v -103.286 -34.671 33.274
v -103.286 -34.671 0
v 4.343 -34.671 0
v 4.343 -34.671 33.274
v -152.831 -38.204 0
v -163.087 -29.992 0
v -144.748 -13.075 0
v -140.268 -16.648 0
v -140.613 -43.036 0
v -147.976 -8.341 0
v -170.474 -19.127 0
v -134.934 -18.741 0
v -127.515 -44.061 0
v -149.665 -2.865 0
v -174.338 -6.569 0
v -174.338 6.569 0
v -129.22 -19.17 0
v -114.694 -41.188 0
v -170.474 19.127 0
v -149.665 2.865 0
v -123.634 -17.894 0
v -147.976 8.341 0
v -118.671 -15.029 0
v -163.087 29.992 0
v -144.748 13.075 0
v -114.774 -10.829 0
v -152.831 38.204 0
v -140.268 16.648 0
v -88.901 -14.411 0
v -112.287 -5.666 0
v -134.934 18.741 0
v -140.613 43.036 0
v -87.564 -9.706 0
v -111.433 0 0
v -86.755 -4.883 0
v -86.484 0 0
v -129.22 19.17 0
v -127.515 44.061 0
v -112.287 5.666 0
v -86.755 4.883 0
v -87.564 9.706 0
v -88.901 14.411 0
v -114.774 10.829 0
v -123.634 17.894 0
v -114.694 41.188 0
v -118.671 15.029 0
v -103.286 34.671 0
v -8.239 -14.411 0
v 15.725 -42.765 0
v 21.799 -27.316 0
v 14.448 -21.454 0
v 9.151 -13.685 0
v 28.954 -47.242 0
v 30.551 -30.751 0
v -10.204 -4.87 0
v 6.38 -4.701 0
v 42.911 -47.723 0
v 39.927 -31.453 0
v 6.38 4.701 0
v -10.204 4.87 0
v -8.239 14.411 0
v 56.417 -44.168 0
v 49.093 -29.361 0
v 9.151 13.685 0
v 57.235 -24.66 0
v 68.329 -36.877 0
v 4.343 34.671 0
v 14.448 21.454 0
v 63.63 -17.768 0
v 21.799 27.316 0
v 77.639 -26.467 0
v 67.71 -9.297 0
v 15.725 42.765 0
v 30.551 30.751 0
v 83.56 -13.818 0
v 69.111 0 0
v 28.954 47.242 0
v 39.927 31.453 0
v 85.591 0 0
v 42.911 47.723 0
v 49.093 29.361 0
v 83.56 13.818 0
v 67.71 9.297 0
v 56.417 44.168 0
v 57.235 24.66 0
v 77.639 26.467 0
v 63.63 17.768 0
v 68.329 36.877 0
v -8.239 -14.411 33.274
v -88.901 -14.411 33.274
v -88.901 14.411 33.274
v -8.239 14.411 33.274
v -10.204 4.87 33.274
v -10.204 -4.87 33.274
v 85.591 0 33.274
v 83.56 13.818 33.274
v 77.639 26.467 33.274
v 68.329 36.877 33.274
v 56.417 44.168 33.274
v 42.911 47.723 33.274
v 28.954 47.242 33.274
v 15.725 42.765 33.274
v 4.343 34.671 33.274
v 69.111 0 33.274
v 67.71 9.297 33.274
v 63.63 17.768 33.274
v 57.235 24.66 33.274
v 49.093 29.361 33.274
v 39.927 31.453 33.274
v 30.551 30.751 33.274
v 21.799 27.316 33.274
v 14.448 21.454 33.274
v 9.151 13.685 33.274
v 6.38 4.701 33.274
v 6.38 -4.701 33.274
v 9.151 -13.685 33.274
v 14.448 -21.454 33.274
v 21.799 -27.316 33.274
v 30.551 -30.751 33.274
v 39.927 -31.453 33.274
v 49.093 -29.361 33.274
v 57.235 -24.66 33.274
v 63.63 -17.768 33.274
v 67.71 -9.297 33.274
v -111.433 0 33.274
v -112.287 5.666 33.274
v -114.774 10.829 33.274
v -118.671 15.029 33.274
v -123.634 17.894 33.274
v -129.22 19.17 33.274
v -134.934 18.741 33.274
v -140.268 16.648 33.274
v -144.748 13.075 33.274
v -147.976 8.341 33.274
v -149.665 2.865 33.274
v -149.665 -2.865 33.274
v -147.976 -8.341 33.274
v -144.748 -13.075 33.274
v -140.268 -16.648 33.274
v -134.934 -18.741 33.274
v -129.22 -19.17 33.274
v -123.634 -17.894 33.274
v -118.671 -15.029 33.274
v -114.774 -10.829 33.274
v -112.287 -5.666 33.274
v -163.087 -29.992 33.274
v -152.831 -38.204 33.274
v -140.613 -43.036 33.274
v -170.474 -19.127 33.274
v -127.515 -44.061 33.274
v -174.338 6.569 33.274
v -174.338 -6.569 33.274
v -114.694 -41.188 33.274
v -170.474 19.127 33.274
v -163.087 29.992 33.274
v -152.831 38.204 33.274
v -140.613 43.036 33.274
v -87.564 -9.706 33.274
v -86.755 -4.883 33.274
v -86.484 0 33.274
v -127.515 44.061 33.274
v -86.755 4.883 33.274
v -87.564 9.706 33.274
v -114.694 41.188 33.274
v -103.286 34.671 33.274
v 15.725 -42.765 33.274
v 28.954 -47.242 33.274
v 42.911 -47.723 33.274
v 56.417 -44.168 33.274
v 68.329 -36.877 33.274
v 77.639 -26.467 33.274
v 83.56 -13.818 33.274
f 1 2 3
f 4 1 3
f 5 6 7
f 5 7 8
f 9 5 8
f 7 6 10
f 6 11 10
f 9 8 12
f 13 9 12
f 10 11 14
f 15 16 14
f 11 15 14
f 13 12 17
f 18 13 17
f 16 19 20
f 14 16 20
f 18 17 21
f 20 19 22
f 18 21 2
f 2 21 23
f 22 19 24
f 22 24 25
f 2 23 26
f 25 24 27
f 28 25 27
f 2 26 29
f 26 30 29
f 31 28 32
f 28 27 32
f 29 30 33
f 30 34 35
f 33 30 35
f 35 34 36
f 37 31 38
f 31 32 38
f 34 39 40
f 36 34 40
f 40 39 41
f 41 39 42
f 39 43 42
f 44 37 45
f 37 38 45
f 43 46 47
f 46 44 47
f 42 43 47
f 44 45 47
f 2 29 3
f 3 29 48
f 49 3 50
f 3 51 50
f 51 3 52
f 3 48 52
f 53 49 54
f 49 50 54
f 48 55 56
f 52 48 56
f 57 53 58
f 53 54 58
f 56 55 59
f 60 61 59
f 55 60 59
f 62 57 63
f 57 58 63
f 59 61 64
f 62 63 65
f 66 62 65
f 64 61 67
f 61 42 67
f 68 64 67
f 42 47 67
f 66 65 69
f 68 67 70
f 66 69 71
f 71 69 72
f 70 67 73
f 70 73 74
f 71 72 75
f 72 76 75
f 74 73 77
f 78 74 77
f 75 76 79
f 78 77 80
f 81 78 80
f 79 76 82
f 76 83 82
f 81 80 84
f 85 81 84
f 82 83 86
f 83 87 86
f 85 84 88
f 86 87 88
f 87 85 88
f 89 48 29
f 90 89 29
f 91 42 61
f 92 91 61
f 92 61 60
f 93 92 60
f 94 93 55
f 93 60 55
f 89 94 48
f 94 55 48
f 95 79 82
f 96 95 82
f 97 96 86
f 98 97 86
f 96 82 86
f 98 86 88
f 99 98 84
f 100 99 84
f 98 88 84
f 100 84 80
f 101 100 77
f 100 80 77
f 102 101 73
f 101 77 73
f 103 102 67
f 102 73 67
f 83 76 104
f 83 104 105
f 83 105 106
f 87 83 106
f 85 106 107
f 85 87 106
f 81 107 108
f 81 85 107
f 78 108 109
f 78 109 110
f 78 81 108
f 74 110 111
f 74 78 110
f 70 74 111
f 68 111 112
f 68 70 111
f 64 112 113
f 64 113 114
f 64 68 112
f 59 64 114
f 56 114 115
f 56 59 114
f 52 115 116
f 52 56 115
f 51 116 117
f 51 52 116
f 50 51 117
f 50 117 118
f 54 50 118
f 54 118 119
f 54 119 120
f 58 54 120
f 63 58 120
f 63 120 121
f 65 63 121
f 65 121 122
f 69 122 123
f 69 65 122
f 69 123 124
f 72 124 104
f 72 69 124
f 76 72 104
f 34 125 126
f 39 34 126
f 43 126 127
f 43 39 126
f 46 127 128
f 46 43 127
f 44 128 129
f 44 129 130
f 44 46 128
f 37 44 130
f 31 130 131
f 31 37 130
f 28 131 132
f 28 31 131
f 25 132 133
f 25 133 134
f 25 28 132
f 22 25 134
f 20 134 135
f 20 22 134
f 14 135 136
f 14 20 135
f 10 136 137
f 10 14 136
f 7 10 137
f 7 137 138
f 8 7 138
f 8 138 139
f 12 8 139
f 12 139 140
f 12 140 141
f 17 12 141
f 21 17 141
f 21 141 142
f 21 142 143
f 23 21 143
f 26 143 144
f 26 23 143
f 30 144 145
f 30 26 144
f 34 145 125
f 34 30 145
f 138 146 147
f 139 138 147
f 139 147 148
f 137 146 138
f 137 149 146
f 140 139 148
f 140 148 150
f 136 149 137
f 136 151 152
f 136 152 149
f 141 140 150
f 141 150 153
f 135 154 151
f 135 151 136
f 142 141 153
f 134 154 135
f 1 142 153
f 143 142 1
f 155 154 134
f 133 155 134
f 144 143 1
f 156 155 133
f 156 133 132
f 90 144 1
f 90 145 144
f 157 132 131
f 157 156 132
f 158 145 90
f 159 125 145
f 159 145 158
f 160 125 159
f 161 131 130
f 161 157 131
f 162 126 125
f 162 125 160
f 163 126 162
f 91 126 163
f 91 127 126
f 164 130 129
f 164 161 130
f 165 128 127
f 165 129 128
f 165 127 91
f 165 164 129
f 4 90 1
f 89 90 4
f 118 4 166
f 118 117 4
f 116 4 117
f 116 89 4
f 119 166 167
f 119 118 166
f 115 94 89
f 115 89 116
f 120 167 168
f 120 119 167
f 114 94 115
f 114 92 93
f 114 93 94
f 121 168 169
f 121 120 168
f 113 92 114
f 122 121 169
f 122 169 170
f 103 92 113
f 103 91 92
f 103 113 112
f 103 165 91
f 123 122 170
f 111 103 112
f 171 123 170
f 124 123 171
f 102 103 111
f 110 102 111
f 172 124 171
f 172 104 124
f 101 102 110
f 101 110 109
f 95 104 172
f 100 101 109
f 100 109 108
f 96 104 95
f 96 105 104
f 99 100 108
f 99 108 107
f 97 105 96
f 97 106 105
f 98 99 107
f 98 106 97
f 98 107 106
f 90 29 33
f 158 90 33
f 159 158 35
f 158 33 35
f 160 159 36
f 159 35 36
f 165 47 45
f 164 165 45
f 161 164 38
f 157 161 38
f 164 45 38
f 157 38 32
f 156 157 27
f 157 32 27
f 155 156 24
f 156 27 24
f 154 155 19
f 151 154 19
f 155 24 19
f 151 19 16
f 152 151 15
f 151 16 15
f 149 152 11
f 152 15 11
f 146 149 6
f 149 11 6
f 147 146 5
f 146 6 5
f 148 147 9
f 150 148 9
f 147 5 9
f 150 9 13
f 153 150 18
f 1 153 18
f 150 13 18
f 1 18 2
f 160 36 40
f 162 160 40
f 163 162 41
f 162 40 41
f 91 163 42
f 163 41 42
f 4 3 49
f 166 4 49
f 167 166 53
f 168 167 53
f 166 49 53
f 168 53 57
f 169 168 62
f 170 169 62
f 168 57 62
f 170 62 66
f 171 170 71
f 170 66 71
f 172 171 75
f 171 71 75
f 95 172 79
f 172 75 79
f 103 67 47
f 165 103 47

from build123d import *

# Parameters (mm, degrees)
F0_R     = 19.223271
F0_R_2   = 31.541662
F1_DEPTH = 33.274


with BuildPart() as f1:
    # F0 (on Top) → F1 (new body)
    with BuildSketch(Plane.XY):
        with BuildLine():
            Line((-8.238693, -14.410725), (-88.9008, -14.410725))
            ThreePointArc((-88.9008, -14.410725), (-94.639506, -25.573134), (-103.286065, -34.670889))
            Line((-103.286065, -34.670889), (4.343193, -34.670889))
            ThreePointArc((4.343193, -34.670889), (-3.225496, -25.334308), (-8.238693, -14.410725))
        make_face()
        with BuildLine():
            ThreePointArc((-103.286065, 34.670889), (-94.639506, 25.573134), (-88.9008, 14.410725))
            Line((-88.9008, 14.410725), (-8.238693, 14.410725))
            ThreePointArc((-8.238693, 14.410725), (-3.225496, 25.334308), (4.343193, 34.670889))
            Line((4.343193, 34.670889), (-103.286065, 34.670889))
        make_face()
        with BuildLine():
            ThreePointArc((4.343193, 34.670889), (-3.225496, 25.334308), (-8.238693, 14.410725))
            ThreePointArc((-8.238693, 14.410725), (-10.451951, 0), (-8.238693, -14.410725))
            ThreePointArc((-8.238693, -14.410725), (-3.225496, -25.334308), (4.343193, -34.670889))
            Line((4.343193, -34.670889), (4.343193, 34.670889))
        make_face()
        with BuildLine():
            ThreePointArc((-88.9008, -14.410725), (-87.092414, -7.305987), (-86.484032, 0))
            ThreePointArc((-86.484032, 0), (-87.092414, 7.305987), (-88.9008, 14.410725))
            ThreePointArc((-88.9008, 14.410725), (-94.639506, 25.573134), (-103.286065, 34.670889))
            Line((-103.286065, 34.670889), (-103.286065, -34.670889))
            ThreePointArc((-103.286065, -34.670889), (-94.639506, -25.573134), (-88.9008, -14.410725))
        make_face()
        with BuildLine():
            Line((-103.286065, -34.670889), (-103.286065, 34.670889))
            ThreePointArc((-103.286065, 34.670889), (-174.829227, 0), (-103.286065, -34.670889))
        make_face()
        with Locations((-130.65663, 0)):
            Circle(F0_R, mode=Mode.SUBTRACT)
        with BuildLine():
            ThreePointArc((85.590833, 0), (56.417298, 44.168002), (4.343193, 34.670889))
            Line((4.343193, 34.670889), (4.343193, -34.670889))
            ThreePointArc((4.343193, -34.670889), (56.417298, -44.168002), (85.590833, 0))
        make_face()
        with Locations((37.569441, 0)):
            Circle(F0_R_2, mode=Mode.SUBTRACT)
    extrude(amount=F1_DEPTH)


solid = f1.part
